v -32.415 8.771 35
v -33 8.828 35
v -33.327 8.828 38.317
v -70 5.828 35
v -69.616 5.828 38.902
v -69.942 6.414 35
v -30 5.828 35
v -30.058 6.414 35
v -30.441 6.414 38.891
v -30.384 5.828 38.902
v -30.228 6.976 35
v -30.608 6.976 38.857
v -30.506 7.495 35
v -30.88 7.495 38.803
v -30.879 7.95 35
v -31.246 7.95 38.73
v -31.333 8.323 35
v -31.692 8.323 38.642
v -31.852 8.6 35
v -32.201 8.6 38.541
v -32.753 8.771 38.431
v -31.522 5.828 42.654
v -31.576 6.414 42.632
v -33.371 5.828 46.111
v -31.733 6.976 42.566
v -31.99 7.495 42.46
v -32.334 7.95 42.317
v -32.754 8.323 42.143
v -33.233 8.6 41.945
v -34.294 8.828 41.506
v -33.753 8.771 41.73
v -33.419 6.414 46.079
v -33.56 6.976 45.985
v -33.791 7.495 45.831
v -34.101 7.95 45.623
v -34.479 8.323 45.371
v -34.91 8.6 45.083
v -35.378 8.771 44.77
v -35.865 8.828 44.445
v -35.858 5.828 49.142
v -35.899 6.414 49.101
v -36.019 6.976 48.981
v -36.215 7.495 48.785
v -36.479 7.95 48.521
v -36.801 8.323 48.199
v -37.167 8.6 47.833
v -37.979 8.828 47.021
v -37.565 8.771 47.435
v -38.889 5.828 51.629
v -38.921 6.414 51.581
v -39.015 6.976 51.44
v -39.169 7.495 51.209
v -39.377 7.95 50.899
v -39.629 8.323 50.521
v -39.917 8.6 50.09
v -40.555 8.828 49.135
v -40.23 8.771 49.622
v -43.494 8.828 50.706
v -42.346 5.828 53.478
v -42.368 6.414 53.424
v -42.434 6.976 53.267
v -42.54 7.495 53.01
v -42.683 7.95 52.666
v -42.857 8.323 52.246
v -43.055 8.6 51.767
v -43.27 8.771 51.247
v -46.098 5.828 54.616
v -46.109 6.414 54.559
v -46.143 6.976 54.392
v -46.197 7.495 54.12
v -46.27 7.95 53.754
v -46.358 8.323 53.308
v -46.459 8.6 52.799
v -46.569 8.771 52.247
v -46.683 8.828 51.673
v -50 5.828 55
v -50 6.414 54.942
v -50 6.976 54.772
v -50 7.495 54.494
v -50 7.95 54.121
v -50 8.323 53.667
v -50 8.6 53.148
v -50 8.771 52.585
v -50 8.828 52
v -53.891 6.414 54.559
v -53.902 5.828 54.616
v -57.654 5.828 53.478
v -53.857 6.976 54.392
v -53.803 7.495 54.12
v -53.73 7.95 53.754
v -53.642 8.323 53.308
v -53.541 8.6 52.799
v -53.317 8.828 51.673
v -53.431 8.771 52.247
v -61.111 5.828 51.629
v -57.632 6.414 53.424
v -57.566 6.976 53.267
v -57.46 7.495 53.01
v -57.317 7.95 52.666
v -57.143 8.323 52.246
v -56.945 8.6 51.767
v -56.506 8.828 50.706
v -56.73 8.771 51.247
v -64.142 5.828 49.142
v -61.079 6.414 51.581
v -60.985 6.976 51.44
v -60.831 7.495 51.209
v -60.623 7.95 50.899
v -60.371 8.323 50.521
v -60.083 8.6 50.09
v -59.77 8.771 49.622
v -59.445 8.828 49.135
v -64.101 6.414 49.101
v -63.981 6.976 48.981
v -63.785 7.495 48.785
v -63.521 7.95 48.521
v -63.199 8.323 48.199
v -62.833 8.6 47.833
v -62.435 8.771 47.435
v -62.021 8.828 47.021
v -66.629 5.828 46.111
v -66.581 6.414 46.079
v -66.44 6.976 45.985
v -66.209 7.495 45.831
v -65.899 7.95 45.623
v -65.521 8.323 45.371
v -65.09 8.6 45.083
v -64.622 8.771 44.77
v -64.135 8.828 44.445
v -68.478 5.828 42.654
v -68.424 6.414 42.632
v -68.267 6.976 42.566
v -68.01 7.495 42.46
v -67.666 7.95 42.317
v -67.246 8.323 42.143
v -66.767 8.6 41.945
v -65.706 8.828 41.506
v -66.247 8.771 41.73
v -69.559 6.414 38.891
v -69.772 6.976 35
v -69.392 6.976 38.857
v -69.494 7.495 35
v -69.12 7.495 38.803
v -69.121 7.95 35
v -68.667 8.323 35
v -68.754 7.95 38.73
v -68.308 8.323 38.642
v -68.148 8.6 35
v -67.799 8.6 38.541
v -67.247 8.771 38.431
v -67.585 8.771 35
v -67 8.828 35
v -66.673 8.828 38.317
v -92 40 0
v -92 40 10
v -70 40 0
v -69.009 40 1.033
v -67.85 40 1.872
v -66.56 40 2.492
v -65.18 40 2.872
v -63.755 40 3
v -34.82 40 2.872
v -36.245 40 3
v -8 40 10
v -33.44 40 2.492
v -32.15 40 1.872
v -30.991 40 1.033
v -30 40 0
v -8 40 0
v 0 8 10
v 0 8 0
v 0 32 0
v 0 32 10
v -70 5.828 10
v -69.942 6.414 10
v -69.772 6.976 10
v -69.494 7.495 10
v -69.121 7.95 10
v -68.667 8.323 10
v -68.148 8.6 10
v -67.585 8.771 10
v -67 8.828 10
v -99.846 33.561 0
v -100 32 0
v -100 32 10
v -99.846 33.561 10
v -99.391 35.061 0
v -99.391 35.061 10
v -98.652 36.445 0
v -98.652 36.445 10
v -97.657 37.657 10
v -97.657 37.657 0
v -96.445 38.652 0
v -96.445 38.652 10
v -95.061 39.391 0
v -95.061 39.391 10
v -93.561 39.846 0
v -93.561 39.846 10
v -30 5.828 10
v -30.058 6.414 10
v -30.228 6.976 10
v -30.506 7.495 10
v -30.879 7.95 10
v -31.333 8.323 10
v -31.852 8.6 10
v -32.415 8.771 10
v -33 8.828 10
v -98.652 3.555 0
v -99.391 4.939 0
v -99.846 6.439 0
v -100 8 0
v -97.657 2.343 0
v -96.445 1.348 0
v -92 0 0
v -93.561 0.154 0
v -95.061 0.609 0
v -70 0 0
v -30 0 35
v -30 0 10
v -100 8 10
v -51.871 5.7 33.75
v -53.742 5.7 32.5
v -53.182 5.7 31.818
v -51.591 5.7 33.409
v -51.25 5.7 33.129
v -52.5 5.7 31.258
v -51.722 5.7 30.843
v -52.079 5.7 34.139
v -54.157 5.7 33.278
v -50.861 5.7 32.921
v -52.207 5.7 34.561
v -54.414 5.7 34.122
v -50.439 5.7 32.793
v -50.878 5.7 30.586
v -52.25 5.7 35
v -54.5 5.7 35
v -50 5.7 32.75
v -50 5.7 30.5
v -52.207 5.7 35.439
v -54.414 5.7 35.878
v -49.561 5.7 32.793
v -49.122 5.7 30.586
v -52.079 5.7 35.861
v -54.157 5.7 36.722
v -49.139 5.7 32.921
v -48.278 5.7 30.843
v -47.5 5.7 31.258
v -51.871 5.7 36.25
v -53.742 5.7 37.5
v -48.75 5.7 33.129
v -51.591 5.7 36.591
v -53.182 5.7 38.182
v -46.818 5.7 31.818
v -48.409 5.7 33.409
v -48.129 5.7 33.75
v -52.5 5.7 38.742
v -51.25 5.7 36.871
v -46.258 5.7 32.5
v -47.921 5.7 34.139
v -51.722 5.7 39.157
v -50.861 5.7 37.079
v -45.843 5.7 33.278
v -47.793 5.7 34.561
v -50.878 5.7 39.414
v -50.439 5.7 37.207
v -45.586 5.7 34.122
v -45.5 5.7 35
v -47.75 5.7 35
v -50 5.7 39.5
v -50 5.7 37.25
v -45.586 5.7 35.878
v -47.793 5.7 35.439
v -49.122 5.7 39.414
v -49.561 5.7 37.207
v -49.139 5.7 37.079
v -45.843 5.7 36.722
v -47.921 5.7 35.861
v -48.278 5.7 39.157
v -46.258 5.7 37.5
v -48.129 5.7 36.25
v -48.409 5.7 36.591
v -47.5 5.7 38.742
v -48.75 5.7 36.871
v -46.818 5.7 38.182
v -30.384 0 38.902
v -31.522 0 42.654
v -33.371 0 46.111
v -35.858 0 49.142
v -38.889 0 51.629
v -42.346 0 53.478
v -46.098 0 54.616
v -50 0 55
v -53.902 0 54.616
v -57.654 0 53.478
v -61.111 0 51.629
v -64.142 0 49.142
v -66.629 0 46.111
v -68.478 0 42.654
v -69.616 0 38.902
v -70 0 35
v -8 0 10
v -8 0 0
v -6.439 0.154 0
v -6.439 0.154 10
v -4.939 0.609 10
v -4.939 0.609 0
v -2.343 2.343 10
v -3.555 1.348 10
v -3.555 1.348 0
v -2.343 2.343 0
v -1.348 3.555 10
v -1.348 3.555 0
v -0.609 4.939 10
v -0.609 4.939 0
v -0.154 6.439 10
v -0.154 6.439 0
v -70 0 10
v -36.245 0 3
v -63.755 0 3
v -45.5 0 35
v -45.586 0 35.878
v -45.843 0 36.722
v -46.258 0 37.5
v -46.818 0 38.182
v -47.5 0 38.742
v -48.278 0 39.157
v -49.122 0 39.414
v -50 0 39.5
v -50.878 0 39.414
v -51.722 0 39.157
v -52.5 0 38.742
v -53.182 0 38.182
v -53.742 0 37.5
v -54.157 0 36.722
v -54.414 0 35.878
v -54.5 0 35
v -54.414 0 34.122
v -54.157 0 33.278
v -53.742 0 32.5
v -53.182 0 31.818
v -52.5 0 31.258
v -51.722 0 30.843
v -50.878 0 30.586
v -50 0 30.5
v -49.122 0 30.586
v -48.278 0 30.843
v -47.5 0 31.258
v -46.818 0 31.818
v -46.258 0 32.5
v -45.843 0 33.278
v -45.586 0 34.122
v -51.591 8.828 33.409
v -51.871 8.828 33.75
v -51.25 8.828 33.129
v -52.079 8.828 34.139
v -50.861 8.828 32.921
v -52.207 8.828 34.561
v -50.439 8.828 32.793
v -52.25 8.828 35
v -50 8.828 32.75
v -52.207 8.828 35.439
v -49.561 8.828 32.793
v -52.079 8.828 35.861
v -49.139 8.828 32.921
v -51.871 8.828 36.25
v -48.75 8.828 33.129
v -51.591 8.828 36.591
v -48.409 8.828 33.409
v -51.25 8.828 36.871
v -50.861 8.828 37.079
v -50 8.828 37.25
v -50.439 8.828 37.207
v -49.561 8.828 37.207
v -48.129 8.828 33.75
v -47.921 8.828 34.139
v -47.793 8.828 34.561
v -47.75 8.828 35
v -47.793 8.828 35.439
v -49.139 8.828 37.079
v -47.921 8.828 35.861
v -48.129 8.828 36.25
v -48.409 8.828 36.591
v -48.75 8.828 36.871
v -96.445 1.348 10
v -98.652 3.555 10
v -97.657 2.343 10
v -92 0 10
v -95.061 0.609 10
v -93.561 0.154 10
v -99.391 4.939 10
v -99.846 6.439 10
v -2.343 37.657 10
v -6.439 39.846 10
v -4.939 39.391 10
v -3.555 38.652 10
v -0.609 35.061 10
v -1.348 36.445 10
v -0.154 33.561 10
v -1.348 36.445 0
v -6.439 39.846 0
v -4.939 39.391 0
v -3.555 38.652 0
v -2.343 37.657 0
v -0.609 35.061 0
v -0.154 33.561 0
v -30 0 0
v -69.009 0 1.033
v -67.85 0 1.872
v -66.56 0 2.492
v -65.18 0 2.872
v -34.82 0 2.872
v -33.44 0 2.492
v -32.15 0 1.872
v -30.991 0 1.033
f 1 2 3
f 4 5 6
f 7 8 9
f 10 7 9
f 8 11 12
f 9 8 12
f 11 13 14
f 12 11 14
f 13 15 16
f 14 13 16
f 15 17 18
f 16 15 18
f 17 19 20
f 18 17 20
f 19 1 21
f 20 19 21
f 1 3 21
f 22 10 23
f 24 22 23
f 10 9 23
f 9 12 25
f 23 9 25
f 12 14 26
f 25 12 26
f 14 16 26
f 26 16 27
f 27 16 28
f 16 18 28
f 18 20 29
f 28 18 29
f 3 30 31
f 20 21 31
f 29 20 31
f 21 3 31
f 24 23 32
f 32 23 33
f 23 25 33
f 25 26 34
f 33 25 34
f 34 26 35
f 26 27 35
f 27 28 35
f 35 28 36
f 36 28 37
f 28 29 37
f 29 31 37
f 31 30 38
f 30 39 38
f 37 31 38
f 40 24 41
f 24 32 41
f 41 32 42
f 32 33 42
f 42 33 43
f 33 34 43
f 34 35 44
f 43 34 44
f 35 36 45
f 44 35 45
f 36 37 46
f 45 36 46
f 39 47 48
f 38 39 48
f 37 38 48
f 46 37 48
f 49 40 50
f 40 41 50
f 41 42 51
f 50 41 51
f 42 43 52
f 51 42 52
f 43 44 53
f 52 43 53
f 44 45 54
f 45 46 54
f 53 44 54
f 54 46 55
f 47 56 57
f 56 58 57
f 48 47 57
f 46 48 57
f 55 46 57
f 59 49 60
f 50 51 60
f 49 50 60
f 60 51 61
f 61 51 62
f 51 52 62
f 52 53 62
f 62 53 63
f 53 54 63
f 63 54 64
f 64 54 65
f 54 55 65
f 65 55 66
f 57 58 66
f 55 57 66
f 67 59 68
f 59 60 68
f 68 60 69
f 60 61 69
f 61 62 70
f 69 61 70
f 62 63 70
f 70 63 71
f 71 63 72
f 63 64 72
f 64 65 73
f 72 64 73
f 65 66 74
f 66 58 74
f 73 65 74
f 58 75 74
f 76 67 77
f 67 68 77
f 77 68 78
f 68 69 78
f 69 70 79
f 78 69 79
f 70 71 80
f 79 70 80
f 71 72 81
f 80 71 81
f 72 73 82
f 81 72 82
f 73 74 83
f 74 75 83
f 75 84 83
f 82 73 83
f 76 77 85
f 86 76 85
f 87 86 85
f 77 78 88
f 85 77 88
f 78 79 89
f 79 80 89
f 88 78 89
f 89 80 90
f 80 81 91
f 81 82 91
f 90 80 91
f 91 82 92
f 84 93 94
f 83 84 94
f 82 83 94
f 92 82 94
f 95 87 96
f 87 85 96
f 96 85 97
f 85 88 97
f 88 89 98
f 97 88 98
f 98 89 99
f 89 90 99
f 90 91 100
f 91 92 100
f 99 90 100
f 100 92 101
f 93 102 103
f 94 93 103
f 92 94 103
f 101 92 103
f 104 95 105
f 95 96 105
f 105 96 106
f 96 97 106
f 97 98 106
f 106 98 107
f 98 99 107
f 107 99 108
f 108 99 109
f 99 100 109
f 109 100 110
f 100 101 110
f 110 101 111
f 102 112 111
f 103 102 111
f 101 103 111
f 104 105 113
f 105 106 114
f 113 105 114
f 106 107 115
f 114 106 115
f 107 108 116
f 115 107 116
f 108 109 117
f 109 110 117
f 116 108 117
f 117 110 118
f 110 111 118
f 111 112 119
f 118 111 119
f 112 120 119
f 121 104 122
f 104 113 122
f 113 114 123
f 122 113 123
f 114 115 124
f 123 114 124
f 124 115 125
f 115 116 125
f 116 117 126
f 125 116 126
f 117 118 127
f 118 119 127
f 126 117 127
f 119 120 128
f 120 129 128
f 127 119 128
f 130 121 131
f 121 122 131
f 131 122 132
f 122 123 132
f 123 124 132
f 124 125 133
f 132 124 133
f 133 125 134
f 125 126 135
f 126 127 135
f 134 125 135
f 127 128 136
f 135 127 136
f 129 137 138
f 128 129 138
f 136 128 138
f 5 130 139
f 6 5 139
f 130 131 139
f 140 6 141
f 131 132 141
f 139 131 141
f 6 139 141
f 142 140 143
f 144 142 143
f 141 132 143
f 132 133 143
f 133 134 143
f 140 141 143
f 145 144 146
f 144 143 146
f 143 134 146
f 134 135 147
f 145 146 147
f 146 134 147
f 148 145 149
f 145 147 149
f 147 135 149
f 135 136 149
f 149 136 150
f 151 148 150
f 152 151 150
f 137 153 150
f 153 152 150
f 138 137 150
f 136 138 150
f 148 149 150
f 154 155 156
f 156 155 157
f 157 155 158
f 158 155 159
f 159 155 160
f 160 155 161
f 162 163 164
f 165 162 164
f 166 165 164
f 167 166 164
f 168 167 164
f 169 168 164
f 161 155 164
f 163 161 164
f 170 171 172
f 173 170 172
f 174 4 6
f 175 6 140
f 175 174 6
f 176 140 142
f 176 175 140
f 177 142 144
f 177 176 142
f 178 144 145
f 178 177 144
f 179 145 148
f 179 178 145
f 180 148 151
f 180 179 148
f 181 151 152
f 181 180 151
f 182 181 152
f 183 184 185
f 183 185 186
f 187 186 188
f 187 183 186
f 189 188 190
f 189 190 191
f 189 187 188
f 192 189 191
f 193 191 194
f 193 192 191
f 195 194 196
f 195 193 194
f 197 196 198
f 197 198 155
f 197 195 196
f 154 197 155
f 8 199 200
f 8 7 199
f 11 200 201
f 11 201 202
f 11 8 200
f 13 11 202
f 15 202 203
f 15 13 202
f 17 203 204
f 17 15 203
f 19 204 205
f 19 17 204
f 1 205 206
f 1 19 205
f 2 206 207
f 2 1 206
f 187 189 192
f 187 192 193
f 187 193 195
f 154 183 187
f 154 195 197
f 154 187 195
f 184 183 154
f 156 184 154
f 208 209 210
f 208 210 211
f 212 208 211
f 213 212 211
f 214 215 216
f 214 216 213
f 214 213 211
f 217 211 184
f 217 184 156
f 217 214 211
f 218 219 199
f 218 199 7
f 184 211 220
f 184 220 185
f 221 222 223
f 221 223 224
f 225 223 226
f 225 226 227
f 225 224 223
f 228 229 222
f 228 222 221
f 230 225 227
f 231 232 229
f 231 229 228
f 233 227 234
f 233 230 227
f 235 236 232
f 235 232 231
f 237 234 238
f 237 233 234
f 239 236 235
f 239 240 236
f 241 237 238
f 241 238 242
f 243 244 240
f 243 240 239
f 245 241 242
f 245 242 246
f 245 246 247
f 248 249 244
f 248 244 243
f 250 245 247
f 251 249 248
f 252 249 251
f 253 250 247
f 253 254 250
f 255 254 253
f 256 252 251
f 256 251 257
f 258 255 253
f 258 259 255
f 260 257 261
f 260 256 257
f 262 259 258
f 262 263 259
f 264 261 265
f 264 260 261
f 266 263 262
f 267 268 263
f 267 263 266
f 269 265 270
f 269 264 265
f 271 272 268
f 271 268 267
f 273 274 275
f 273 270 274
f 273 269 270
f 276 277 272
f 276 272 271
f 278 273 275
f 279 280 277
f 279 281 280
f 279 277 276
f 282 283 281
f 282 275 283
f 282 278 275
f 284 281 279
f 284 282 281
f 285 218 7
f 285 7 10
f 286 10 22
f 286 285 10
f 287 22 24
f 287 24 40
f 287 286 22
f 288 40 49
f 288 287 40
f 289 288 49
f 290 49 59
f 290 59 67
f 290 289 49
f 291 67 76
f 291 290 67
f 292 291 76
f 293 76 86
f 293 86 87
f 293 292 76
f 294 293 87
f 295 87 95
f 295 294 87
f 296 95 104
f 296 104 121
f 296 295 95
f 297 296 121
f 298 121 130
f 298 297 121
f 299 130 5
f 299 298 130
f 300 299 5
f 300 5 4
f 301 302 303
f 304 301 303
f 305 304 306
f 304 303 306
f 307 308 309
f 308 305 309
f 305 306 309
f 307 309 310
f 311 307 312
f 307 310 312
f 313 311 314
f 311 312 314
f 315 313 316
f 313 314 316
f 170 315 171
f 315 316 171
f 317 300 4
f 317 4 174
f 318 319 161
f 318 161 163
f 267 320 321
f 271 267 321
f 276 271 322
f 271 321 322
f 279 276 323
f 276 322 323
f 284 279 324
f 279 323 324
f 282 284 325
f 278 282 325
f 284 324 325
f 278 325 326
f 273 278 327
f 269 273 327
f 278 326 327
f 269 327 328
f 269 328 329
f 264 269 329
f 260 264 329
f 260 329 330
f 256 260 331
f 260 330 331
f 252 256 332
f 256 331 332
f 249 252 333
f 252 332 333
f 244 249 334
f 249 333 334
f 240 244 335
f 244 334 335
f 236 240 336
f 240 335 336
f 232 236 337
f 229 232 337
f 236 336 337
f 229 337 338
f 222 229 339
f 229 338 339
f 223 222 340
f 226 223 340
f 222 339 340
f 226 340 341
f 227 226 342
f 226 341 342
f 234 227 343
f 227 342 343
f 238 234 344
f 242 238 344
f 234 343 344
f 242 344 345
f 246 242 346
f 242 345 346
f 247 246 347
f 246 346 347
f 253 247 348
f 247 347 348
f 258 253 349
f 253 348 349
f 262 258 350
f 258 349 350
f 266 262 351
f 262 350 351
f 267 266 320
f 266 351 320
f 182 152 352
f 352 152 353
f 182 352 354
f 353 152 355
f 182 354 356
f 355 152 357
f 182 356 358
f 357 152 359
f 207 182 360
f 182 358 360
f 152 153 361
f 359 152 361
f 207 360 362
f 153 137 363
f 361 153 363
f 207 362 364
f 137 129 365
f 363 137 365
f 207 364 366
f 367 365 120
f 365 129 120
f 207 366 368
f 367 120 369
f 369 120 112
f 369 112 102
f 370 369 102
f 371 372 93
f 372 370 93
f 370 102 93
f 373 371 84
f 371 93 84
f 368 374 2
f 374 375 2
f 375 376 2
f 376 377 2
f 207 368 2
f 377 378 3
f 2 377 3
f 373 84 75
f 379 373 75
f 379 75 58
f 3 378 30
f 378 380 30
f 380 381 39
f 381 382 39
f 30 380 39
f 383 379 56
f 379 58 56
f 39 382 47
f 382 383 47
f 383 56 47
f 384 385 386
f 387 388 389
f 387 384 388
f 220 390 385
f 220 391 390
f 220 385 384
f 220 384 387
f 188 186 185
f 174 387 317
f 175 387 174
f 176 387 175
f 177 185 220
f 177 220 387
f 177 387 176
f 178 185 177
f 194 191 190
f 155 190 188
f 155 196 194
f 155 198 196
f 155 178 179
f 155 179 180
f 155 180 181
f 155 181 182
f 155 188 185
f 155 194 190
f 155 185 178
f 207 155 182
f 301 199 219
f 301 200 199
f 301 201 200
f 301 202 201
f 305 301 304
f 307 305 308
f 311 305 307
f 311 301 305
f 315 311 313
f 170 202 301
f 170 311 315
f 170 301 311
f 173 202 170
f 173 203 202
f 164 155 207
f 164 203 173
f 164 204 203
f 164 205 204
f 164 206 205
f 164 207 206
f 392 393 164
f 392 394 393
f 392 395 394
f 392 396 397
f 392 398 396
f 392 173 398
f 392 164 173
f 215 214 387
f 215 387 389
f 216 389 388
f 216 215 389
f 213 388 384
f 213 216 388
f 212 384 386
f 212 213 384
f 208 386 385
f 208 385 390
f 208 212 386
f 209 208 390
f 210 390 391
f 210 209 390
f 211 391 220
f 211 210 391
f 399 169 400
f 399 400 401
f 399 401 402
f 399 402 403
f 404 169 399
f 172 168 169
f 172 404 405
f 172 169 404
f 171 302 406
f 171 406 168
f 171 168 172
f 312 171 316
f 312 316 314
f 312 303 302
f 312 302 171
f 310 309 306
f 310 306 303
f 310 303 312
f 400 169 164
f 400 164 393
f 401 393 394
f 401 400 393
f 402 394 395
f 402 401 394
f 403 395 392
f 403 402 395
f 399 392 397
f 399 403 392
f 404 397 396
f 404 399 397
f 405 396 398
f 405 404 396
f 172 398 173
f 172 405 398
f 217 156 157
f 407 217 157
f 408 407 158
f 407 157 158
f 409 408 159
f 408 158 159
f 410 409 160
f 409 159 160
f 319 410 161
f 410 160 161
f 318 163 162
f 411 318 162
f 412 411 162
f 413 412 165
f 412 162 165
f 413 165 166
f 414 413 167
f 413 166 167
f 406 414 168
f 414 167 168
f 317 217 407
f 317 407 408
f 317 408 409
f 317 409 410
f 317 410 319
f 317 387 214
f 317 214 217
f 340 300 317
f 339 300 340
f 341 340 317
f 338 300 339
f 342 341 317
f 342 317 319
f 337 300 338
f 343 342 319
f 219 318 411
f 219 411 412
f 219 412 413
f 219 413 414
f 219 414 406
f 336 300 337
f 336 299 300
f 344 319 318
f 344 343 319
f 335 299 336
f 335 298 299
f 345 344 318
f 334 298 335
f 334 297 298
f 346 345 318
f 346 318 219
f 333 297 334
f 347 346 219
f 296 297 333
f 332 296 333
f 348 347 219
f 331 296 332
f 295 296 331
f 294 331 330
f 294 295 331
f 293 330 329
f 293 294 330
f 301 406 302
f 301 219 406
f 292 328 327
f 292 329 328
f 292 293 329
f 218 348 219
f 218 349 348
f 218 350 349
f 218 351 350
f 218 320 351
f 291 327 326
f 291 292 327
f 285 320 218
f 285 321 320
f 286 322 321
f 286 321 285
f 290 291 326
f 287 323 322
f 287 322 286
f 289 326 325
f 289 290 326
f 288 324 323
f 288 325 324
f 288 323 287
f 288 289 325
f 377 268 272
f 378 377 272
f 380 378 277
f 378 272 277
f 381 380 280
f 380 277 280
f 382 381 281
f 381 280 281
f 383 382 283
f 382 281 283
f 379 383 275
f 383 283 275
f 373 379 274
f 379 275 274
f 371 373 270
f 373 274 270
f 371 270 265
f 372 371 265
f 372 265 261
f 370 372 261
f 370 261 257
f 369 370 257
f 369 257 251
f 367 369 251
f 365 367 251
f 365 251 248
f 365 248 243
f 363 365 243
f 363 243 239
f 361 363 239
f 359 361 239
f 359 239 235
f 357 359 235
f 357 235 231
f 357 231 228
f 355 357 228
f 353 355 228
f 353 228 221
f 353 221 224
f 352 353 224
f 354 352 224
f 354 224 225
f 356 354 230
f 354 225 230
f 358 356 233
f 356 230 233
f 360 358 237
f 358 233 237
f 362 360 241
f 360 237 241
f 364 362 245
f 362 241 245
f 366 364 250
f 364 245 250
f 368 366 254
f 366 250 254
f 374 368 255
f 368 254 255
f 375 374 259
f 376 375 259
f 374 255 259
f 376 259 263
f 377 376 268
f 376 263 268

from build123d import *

# Parameters (mm, degrees)
F0_W         = 100
F0_H         = 40
F1_DEPTH     = 10
F3_DEPTH     = 8.82827
F4_W         = 40
F4_H         = 3
F5_DEPTH     = 40.001
F6_R         = 2.25
F7_DEPTH     = 40.001
F8_R         = 4.5
F9_DEPTH     = 5.7
F10_T1_DEPTH = 40
F10_T3_DEPTH = 50
F10_T5_DEPTH = 50
F10_T7_DEPTH = 50
F10_T9_DEPTH = 50
F11_T1_DEPTH = 40
F12_R        = 3


# Not quite as in the source:
# - a fillet or chamfer that OpenCascade refuses, or shapes differently, is made with other operations: its cross-section is extruded or revolved along the edge and cut away or added


with BuildPart() as f1:
    # F0 (on Top) → F1 (new body)
    with BuildSketch(Plane.XY):
        with Locations((-50, 20)):
            Rectangle(F0_W, F0_H)
    extrude(amount=F1_DEPTH)

    # F2 (on face) → F3 (join)
    with BuildSketch(Plane.XZ):
        with BuildLine():
            ThreePointArc((-30, 35), (-50, 55), (-70, 35))
            Line((-70, 35), (-70, 0))
            Line((-70, 0), (-30, 0))
            Line((-30, 0), (-30, 35))
        make_face()
    extrude(amount=-F3_DEPTH)

    # F4 (on Front) → F5 (cut, through all)
    with BuildSketch(Plane.XZ):
        with Locations((-50, 1.5)):
            Rectangle(F4_W, F4_H)
    extrude(amount=-F5_DEPTH, mode=Mode.SUBTRACT)

    # F6 (on face) → F7 (cut, through all)
    with BuildSketch(Plane.XZ):
        with Locations((-50, 35)):
            Circle(F6_R)
    extrude(amount=-F7_DEPTH, mode=Mode.SUBTRACT)

    # F8 (on face) → F9 (cut)
    with BuildSketch(Plane.XZ):
        with Locations((-50, 35)):
            Circle(F8_R)
    extrude(amount=-F9_DEPTH, mode=Mode.SUBTRACT)

    # F10: fillet of radius 8 on 5 edges, made by hand

    # F10_s2 → F10_t1 (join)
    with BuildSketch(Plane.XZ.offset(-40)):
        with BuildLine():
            ThreePointArc((-36.2449979984, 3), (-32.7808963833, 2.2111025509), (-30, 0))
            Line((-30, 0), (-30, 3))
            Line((-30, 3), (-36.2449979984, 3))
        make_face()
    extrude(amount=F10_T1_DEPTH)

    # F10_s4 → F10_t3 (cut)
    with BuildSketch(Plane.XY.offset(-20)):
        with BuildLine():
            ThreePointArc((-92, 0), (-97.6568542495, 2.3431457505), (-100, 8))
            Line((-100, 8), (-100, 0))
            Line((-100, 0), (-92, 0))
        make_face()
    extrude(amount=F10_T3_DEPTH, mode=Mode.SUBTRACT)

    # F10_s6 → F10_t5 (cut)
    with BuildSketch(Plane.XY.offset(-20)):
        with BuildLine():
            ThreePointArc((-8, 0), (-2.3431457505, 2.3431457505), (0, 8))
            Line((0, 8), (0, 0))
            Line((0, 0), (-8, 0))
        make_face()
    extrude(amount=F10_T5_DEPTH, mode=Mode.SUBTRACT)

    # F10_s8 → F10_t7 (cut)
    with BuildSketch(Plane.XY.offset(-20)):
        with BuildLine():
            ThreePointArc((-100, 32), (-97.6568542495, 37.6568542495), (-92, 40))
            Line((-92, 40), (-100, 40))
            Line((-100, 40), (-100, 32))
        make_face()
    extrude(amount=F10_T7_DEPTH, mode=Mode.SUBTRACT)

    # F10_s10 → F10_t9 (cut)
    with BuildSketch(Plane.XY.offset(-20)):
        with BuildLine():
            ThreePointArc((-8, 40), (-2.3431457505, 37.6568542495), (0, 32))
            Line((0, 32), (0, 40))
            Line((0, 40), (-8, 40))
        make_face()
    extrude(amount=F10_T9_DEPTH, mode=Mode.SUBTRACT)

    # F11: fillet of radius 8 on 1 edges, made by hand

    # F11_s2 → F11_t1 (join)
    with BuildSketch(Plane.XZ.offset(-40)):
        with BuildLine():
            ThreePointArc((-70, 0), (-67.2191036167, 2.2111025509), (-63.7550020016, 3))
            Line((-63.7550020016, 3), (-70, 3))
            Line((-70, 3), (-70, 0))
        make_face()
    extrude(amount=F11_T1_DEPTH)

    # F12
    f12_edges = [f1.edges().sort_by_distance(p)[0] for p in [
        (-50, 8.82827, 55),
        (-30, 8.82827, 22.5),
        (-70, 8.82827, 22.5),
    ]]
    fillet(f12_edges, radius=F12_R)


solid = f1.part
